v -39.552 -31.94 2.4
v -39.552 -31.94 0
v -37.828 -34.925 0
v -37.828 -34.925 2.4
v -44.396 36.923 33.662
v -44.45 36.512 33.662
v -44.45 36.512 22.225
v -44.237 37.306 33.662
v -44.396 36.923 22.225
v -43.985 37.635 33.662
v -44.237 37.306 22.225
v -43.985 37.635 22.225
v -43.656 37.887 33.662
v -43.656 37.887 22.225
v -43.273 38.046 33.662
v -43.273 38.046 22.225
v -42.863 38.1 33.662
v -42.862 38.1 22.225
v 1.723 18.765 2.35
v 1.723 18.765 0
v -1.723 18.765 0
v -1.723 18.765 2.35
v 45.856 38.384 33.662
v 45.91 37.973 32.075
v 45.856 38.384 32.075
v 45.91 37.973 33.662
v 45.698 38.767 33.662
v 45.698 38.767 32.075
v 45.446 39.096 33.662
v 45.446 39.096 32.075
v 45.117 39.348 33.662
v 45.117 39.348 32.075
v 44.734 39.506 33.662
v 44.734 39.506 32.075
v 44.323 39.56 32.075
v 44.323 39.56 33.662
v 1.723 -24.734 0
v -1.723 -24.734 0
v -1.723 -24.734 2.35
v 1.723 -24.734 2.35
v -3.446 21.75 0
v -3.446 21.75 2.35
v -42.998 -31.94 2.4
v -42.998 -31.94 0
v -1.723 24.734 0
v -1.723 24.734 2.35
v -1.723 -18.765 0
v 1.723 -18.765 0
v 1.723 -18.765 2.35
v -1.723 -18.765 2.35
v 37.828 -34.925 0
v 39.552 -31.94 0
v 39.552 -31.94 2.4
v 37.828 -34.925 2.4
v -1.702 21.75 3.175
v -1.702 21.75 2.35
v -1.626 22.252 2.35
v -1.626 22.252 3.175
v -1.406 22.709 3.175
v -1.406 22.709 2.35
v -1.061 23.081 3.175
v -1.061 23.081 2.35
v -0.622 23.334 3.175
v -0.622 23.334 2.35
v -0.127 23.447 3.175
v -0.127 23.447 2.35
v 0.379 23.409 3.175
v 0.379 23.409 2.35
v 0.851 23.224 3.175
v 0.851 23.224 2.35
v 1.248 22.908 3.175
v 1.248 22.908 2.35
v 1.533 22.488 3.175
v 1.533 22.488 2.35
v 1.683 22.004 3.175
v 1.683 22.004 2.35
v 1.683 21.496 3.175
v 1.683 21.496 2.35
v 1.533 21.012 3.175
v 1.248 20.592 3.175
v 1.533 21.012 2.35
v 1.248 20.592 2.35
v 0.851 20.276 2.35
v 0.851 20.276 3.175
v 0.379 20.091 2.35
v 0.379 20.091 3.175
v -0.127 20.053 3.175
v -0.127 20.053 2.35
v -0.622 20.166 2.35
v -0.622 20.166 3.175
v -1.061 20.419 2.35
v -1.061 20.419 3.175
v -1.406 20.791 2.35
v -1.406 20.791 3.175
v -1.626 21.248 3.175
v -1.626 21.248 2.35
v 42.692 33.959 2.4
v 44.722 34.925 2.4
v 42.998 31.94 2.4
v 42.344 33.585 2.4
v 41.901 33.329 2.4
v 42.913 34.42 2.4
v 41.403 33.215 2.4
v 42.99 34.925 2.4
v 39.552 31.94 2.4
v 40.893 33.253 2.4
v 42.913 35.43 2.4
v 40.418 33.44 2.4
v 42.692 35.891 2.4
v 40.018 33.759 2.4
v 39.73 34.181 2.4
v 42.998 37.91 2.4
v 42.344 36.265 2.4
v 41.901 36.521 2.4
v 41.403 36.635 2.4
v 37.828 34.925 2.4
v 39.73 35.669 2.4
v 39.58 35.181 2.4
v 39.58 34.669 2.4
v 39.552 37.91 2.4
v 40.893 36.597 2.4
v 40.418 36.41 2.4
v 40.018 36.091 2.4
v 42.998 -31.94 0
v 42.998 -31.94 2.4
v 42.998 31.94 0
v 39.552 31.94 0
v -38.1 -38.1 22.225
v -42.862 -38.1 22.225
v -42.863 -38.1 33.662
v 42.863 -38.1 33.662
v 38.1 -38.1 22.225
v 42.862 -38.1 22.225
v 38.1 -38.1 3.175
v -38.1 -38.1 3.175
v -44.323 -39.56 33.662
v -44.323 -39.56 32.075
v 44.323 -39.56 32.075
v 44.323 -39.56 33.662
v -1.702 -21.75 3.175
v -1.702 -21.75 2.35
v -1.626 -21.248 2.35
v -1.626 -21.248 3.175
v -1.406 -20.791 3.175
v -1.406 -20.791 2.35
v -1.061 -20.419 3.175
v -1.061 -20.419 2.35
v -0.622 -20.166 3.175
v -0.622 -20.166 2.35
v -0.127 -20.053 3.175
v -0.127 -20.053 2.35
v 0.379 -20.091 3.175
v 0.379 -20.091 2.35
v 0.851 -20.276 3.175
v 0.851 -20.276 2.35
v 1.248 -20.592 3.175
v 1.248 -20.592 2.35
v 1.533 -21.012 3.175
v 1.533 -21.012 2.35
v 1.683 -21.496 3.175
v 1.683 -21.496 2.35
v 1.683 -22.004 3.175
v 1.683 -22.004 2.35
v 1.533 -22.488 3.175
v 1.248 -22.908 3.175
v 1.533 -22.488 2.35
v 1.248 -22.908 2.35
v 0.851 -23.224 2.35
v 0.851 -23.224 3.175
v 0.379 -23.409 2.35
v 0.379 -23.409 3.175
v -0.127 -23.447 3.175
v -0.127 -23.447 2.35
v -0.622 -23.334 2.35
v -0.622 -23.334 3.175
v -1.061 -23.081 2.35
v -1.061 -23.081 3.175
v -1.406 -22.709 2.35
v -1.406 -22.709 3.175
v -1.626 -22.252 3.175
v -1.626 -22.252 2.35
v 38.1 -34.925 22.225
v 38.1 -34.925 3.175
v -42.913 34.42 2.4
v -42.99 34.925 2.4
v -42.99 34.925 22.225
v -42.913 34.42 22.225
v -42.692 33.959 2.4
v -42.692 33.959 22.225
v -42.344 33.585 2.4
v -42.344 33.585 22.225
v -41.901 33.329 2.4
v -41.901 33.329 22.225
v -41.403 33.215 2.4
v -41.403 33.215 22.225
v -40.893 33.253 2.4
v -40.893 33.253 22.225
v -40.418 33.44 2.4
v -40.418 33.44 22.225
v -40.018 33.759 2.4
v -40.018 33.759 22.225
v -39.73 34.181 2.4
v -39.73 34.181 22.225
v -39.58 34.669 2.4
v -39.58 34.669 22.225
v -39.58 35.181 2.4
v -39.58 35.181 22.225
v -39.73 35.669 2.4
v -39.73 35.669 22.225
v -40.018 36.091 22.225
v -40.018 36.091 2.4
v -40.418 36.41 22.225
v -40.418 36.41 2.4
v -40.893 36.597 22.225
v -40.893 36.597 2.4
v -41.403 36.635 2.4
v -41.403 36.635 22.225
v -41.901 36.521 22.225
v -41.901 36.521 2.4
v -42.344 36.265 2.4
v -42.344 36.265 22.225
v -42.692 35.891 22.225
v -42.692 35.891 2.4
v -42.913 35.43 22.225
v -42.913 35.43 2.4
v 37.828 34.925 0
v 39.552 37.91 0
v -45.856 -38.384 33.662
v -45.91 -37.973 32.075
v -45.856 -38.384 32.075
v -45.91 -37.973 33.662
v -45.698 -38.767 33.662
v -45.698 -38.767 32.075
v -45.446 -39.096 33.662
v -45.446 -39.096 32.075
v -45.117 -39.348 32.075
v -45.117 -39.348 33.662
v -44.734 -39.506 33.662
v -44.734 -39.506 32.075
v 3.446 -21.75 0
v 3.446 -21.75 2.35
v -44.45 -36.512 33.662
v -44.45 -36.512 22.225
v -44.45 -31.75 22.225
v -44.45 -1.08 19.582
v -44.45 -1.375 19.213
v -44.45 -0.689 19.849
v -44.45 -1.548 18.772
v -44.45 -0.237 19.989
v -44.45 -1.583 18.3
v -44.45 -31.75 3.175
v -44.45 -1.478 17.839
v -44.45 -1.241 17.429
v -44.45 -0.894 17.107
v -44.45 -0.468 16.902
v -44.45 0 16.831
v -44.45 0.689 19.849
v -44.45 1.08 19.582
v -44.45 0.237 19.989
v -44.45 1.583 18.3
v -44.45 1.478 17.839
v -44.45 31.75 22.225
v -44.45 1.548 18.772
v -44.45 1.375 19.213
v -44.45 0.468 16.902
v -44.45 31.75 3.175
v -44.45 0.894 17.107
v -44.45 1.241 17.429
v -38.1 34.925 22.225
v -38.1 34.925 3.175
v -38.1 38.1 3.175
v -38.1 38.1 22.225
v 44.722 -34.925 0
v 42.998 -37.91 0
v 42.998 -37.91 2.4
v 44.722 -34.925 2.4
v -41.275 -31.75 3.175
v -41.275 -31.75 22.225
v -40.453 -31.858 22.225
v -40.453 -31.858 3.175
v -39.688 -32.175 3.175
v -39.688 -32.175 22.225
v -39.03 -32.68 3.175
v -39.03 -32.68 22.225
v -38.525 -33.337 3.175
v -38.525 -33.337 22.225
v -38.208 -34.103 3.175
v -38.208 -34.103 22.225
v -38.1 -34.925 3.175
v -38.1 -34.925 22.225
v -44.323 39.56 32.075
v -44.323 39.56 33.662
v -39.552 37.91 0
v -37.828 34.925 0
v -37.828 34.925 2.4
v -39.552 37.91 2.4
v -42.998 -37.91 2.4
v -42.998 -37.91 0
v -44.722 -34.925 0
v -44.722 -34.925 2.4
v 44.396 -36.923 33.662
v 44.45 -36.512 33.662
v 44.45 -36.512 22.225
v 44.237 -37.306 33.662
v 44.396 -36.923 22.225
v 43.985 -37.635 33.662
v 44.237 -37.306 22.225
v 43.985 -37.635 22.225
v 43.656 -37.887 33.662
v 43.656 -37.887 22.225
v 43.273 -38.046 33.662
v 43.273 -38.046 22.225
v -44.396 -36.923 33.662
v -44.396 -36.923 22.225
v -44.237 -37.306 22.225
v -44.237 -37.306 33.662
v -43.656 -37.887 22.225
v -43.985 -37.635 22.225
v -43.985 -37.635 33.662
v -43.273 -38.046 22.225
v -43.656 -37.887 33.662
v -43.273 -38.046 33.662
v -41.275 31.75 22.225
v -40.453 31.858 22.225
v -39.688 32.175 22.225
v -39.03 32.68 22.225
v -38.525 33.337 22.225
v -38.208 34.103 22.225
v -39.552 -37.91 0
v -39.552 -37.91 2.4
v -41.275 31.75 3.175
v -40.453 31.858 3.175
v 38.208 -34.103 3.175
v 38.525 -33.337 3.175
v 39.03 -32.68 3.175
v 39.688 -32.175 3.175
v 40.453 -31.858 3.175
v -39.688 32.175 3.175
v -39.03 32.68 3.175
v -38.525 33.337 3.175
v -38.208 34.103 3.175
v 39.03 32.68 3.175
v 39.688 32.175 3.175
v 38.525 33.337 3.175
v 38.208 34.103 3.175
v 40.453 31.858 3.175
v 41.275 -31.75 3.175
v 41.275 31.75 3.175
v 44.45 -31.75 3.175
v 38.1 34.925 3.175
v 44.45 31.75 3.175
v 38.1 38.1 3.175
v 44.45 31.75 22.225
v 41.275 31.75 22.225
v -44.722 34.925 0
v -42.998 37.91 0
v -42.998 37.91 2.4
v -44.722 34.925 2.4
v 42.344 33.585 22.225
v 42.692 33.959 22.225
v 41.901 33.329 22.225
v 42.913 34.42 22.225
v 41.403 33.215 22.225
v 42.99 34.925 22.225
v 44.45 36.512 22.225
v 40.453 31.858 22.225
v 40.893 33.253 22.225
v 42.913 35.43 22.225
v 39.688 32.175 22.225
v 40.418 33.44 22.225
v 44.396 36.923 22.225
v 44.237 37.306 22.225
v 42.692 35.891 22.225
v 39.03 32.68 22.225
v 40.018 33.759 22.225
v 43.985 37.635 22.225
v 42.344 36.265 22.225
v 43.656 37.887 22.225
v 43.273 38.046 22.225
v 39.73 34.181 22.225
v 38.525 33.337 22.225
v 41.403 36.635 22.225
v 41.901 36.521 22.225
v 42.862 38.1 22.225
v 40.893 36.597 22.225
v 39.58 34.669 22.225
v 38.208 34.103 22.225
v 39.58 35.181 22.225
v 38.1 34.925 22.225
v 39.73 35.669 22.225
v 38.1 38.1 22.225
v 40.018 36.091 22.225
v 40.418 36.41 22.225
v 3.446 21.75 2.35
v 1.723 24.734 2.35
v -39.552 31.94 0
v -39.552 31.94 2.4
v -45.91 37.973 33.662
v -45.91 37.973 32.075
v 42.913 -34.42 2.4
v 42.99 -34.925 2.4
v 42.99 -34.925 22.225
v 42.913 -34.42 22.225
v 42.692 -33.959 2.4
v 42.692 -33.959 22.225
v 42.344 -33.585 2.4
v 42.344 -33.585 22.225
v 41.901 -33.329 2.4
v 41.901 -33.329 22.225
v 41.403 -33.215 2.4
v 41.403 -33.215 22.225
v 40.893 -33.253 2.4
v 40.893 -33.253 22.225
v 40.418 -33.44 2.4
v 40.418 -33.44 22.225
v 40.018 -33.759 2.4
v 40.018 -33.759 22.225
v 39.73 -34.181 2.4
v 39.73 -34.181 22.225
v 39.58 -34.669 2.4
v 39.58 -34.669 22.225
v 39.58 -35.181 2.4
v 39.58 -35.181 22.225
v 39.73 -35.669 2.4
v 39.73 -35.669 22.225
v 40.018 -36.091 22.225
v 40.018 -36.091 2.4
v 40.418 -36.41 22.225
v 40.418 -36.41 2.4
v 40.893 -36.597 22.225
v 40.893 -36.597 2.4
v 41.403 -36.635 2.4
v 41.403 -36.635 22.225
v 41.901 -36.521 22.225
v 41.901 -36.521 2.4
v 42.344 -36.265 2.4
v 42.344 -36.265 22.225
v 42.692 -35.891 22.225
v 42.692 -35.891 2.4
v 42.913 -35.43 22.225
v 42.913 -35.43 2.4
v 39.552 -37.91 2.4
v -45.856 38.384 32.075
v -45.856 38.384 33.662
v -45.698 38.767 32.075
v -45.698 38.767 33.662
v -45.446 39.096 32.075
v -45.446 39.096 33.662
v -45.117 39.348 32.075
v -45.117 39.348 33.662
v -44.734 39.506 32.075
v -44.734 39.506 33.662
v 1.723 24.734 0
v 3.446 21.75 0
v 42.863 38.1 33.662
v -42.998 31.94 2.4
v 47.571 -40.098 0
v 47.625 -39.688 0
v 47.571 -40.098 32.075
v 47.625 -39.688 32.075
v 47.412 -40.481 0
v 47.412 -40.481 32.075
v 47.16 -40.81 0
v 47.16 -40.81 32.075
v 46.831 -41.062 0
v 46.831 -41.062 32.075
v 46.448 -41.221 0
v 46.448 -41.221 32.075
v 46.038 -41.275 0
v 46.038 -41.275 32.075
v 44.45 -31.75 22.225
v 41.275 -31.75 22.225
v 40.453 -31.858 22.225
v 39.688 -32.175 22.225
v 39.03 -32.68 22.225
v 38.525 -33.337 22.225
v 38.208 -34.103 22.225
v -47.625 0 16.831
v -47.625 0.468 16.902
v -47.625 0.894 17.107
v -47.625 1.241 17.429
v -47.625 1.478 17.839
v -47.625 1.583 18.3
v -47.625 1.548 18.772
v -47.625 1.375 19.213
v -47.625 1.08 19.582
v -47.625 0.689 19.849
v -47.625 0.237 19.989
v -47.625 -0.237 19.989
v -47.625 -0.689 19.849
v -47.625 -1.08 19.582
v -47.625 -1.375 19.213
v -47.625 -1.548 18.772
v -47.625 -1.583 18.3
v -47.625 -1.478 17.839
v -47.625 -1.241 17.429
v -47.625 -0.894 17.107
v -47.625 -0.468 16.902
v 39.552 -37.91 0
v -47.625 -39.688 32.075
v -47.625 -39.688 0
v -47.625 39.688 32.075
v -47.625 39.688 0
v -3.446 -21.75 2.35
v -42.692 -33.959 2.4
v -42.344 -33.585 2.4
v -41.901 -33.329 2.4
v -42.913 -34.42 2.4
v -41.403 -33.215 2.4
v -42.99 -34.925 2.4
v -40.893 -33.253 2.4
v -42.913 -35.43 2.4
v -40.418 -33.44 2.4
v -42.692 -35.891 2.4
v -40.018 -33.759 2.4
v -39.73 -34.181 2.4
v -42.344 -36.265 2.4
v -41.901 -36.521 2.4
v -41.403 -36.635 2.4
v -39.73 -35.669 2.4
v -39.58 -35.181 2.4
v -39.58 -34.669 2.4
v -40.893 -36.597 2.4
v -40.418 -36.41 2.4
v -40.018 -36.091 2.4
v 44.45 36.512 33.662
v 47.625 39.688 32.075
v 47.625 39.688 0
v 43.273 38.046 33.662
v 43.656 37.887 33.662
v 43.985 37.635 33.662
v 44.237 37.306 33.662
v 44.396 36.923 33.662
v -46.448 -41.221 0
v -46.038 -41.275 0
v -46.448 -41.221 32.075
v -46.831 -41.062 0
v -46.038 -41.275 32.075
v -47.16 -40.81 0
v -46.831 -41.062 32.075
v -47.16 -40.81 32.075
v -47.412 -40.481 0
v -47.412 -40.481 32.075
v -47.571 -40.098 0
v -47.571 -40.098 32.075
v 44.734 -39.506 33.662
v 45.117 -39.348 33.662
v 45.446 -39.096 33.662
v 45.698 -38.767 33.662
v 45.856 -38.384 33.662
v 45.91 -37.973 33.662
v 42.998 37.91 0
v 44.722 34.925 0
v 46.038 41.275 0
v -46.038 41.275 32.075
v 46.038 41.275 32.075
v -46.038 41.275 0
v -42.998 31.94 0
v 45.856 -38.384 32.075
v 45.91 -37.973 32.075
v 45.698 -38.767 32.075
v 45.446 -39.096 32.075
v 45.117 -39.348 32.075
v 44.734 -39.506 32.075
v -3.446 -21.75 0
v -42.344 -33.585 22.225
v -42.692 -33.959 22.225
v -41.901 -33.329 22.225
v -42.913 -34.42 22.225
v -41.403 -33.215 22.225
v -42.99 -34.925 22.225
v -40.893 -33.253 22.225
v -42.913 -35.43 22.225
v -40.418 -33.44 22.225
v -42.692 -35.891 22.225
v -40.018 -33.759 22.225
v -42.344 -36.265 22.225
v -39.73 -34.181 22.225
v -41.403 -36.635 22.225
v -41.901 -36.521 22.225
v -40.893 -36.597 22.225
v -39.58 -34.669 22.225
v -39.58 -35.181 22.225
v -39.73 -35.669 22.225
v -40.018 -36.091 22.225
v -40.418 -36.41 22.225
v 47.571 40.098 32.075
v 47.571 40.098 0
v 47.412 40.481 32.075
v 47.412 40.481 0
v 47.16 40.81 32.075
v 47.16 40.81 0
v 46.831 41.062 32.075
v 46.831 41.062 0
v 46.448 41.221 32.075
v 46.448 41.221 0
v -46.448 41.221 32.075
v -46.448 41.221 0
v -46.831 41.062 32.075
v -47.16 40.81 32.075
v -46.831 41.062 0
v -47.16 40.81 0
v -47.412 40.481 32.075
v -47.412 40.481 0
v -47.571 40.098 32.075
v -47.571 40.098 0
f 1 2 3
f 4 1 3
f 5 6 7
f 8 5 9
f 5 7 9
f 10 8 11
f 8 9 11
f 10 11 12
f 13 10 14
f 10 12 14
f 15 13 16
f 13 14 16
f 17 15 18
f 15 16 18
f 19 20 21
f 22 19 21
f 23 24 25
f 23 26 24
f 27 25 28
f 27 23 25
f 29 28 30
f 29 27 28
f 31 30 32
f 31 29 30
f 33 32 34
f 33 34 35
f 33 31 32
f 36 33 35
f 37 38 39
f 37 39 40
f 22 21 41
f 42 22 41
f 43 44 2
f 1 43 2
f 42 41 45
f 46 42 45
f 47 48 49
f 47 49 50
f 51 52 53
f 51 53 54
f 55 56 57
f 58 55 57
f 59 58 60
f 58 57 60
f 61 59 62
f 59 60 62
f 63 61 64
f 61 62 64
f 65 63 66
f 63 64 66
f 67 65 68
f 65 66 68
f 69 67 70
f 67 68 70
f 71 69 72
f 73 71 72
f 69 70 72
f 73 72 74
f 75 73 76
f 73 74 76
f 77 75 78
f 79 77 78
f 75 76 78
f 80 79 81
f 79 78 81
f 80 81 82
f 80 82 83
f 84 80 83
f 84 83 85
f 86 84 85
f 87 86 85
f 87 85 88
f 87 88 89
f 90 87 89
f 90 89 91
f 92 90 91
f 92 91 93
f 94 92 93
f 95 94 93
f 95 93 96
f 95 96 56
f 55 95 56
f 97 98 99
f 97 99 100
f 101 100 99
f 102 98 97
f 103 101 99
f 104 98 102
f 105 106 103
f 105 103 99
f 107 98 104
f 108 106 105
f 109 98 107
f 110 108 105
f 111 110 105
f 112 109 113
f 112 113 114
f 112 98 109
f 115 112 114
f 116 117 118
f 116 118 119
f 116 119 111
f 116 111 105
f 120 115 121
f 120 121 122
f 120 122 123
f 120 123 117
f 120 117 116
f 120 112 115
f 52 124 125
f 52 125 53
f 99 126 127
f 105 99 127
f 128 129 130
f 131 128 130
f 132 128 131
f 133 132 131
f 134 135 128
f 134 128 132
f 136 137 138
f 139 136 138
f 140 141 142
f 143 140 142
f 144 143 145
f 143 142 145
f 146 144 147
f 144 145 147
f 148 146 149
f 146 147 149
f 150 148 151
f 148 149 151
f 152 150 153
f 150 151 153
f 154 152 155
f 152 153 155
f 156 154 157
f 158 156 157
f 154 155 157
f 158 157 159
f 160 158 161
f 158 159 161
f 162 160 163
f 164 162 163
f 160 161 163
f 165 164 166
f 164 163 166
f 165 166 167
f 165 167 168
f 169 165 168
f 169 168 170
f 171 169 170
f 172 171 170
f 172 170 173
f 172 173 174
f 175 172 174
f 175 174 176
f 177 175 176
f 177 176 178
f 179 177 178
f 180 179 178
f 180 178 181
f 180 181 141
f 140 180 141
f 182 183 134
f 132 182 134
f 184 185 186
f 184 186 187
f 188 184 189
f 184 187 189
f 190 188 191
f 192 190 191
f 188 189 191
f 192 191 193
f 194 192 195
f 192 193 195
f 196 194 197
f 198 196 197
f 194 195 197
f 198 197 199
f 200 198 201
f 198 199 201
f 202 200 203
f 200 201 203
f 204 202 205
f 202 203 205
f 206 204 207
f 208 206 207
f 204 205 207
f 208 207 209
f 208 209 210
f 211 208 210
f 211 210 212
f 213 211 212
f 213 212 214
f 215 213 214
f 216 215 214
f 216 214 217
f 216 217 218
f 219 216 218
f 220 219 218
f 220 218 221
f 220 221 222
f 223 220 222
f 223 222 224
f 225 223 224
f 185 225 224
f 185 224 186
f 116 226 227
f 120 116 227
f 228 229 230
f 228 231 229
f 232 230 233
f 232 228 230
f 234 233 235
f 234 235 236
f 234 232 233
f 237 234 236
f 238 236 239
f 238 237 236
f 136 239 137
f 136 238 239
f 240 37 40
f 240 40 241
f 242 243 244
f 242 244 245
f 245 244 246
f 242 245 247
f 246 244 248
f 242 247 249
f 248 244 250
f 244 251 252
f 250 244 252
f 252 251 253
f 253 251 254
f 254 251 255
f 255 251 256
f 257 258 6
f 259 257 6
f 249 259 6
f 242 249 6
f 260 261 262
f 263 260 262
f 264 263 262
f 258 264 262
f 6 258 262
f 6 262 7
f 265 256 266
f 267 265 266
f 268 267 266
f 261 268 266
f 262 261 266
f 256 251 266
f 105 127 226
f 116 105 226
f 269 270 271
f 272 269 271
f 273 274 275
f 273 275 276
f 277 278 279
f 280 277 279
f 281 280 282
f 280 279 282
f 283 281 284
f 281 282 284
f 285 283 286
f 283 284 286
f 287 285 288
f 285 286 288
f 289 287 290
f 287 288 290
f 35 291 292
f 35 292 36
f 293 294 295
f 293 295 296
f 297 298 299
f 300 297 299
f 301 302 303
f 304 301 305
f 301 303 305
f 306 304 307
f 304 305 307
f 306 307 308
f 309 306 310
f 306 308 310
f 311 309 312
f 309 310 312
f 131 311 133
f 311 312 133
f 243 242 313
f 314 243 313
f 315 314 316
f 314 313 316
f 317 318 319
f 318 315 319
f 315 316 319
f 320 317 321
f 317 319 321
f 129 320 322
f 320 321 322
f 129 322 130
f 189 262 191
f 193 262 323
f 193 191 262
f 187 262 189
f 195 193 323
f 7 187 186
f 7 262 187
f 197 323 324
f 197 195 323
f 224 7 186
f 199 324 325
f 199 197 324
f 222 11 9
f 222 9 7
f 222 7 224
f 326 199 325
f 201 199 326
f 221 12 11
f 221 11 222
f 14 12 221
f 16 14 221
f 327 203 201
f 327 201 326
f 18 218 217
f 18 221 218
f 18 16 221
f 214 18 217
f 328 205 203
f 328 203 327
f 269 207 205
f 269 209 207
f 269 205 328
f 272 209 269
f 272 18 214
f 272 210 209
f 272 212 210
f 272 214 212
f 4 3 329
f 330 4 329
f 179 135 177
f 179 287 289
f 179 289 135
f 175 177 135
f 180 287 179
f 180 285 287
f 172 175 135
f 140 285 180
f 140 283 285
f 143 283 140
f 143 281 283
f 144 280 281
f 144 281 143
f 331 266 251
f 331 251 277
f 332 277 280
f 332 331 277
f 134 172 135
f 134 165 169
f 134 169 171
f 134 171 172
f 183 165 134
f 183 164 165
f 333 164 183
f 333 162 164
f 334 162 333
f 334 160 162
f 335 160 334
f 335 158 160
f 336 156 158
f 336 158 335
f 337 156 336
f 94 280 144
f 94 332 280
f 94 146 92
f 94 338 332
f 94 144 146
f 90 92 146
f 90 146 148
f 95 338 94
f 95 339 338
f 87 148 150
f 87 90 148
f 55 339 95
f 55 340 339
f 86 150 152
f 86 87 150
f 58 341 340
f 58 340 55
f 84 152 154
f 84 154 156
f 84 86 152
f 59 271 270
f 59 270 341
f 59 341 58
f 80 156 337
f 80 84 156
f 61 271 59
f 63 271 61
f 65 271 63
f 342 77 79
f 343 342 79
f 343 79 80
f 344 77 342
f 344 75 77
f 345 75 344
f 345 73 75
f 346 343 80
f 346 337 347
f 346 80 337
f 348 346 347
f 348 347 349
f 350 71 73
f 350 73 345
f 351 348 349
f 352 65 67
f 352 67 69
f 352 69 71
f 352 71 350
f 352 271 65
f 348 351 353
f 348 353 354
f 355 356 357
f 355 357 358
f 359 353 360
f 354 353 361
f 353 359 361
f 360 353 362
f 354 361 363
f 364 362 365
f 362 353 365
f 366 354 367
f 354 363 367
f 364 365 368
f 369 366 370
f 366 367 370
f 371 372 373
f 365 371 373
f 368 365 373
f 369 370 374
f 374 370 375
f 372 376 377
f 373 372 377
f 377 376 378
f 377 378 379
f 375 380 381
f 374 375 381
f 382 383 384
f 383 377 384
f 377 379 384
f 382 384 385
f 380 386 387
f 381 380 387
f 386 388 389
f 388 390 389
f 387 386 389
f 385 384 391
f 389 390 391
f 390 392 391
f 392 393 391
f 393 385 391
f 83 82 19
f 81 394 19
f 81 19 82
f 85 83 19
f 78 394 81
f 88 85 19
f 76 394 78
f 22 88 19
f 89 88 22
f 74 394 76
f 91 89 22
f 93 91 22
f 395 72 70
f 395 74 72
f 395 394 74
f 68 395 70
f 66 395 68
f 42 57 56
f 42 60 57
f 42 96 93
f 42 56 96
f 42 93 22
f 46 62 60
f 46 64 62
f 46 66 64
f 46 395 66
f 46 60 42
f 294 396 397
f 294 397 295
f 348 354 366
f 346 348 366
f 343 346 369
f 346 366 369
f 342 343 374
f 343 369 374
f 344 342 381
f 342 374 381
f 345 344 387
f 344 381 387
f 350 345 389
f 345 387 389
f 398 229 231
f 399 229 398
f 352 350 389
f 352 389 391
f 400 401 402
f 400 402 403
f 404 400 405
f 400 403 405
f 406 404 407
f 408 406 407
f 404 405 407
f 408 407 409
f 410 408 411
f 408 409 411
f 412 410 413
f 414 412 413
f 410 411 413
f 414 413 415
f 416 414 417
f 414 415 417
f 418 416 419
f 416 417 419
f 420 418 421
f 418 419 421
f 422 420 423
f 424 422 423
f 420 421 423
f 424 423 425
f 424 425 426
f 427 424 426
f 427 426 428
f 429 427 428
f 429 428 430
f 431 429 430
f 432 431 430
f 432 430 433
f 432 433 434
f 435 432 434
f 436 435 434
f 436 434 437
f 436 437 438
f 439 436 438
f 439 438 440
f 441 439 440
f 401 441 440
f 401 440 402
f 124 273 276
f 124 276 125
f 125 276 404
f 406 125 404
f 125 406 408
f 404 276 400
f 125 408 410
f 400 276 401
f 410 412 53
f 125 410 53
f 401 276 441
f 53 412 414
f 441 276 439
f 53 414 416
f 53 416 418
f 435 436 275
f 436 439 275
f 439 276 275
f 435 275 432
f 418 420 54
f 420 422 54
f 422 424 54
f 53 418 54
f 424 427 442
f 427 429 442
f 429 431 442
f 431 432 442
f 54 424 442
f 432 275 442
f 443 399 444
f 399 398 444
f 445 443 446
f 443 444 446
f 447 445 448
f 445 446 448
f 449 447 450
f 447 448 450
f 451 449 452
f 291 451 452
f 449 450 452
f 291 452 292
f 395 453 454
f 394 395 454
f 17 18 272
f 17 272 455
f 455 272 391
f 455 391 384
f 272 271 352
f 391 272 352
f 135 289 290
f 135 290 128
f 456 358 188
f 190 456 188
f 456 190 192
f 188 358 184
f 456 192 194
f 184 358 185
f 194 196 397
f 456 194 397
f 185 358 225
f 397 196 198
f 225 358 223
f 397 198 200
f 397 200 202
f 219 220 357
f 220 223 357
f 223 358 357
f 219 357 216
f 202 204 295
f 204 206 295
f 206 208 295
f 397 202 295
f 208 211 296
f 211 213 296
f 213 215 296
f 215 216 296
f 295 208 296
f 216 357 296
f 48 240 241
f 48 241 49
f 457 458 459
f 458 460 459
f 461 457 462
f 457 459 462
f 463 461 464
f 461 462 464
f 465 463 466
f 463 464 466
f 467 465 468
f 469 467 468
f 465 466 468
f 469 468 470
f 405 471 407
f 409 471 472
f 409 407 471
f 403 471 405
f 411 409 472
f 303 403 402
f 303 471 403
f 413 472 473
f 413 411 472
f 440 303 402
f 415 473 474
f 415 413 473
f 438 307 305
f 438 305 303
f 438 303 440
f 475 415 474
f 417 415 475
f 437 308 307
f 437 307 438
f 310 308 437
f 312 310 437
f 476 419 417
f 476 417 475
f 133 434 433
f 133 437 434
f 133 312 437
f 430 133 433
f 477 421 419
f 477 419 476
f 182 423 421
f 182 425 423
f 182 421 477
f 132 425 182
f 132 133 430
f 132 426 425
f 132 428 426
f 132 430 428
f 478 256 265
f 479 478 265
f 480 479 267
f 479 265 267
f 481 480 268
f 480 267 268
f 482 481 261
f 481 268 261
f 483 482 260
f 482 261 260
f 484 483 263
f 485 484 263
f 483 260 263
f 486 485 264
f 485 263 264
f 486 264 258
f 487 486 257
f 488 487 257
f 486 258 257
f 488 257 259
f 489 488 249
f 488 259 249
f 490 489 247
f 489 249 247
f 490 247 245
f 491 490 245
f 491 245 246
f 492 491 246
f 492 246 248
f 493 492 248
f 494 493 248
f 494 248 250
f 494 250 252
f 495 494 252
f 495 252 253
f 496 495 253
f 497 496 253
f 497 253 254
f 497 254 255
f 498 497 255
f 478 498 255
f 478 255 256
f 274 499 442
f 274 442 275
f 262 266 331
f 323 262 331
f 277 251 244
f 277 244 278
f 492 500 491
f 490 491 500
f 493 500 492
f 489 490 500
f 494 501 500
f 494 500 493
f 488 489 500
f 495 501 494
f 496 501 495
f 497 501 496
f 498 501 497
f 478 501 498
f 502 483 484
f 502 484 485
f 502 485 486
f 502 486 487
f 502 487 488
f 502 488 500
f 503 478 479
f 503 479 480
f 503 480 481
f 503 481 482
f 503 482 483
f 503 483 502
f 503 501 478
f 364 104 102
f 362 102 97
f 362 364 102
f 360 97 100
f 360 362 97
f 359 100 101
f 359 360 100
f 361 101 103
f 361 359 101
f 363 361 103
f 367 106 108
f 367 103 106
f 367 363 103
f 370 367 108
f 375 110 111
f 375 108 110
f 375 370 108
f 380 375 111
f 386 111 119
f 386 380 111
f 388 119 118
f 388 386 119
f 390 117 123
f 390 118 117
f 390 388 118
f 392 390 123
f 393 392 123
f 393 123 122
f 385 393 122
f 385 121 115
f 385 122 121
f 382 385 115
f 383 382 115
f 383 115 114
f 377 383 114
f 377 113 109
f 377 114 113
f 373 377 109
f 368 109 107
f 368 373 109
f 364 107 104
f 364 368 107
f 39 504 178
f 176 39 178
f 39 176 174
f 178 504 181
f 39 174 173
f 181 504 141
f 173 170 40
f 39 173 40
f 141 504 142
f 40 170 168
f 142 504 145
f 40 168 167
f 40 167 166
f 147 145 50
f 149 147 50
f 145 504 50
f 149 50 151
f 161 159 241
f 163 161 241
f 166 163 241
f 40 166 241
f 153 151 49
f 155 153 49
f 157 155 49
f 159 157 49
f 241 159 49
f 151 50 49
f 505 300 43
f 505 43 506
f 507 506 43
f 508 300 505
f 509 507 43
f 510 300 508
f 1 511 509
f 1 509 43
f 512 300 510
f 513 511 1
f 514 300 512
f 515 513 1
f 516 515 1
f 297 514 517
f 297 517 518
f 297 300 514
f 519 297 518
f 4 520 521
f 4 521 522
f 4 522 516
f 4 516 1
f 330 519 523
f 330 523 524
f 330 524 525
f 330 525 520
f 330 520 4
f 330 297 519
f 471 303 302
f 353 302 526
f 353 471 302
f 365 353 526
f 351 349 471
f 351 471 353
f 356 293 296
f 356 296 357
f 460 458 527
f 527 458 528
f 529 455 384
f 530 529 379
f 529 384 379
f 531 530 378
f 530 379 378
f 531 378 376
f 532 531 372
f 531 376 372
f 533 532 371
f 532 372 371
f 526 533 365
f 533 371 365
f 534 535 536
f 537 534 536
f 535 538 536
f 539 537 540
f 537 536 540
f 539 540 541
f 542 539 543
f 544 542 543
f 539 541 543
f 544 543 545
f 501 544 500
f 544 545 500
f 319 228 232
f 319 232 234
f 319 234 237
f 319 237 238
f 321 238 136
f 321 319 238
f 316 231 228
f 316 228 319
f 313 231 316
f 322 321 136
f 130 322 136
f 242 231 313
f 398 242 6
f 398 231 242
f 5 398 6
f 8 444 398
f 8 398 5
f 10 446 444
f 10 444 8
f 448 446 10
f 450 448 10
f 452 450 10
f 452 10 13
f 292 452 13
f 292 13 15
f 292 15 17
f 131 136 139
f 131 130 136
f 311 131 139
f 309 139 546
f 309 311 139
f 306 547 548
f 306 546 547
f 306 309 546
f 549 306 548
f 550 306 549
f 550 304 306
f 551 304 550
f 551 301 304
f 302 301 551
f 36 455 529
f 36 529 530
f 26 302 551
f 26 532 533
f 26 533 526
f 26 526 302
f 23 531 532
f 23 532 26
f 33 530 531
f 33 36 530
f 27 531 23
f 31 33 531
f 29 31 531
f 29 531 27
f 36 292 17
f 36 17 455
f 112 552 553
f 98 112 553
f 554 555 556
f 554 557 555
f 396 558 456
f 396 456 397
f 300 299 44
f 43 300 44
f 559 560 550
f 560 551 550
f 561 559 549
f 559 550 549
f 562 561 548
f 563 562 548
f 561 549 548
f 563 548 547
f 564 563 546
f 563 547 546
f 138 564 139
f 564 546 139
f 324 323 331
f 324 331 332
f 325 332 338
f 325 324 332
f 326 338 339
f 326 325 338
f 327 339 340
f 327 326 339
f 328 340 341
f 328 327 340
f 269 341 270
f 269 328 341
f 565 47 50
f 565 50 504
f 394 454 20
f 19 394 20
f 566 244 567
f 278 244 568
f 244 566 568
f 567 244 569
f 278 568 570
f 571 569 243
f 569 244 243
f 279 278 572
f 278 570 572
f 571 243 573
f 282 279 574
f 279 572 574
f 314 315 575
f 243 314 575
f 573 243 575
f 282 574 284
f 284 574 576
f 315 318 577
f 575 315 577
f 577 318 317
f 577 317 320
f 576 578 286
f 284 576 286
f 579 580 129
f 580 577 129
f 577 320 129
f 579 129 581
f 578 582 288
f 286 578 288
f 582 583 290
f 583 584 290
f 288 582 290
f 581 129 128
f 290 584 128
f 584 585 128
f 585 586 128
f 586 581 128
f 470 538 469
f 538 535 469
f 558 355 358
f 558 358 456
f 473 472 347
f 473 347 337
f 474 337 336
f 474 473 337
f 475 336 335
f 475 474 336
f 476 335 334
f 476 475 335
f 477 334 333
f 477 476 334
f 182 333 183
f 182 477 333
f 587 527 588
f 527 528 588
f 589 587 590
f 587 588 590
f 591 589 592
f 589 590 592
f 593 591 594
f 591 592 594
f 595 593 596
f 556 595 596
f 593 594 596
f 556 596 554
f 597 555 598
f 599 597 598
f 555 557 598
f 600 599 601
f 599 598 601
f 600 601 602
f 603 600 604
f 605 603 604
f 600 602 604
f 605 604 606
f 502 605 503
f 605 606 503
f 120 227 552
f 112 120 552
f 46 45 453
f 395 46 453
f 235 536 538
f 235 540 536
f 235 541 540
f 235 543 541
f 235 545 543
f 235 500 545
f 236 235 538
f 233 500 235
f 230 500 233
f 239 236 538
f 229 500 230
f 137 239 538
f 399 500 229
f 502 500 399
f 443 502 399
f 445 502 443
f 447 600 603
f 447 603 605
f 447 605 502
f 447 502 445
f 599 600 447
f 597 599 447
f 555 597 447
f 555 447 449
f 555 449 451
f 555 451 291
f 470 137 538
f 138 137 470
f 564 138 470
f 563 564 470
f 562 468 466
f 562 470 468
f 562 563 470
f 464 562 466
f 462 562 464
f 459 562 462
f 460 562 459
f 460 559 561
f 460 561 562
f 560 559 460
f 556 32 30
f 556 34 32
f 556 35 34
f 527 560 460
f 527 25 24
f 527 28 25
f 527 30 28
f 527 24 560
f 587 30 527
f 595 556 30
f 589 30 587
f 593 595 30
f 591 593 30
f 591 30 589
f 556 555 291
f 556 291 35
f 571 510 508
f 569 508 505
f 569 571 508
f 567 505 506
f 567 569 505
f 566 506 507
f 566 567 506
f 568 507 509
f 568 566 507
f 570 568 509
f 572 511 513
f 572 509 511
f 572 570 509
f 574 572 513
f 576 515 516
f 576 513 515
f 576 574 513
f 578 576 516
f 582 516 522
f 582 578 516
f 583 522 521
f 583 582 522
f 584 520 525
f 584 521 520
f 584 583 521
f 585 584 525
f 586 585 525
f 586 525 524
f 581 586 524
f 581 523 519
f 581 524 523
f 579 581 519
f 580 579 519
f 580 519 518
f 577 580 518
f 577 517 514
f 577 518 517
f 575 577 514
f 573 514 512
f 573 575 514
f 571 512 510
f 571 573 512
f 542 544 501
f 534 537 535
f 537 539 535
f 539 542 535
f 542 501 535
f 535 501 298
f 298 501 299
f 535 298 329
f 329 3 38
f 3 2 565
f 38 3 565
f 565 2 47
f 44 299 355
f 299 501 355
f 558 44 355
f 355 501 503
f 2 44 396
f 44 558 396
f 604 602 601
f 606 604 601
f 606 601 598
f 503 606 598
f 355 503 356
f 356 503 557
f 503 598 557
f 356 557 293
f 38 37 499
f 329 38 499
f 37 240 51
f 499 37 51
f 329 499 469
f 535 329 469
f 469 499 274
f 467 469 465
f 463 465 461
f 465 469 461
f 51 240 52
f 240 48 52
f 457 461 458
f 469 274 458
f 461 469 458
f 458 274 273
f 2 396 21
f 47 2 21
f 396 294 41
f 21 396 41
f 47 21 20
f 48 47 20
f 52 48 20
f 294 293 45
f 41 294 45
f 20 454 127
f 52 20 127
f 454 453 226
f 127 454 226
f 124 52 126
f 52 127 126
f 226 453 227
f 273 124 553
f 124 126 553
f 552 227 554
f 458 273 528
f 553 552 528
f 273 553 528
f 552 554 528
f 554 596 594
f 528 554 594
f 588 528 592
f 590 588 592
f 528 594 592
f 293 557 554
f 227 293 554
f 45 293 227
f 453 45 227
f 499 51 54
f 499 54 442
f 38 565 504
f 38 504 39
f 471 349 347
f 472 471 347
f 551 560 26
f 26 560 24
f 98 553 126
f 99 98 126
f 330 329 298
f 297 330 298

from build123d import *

# Parameters (mm, degrees)
SKETCH1_W                                    = 95.25
SKETCH1_H                                    = 82.55
BOSS_EXTRUDE1_DEPTH                          = 3.175
SKETCH2_W                                    = 95.25
SKETCH2_H                                    = 82.55
SKETCH2_W_2                                  = 88.9
SKETCH2_H_2                                  = 76.2
BOSS_EXTRUDE2_DEPTH                          = 28.9
SKETCH3_W                                    = 91.821
SKETCH3_H                                    = 79.121
SKETCH3_W_2                                  = 88.9
SKETCH3_H_2                                  = 76.2
BOSS_EXTRUDE3_DEPTH                          = 1.5875
FILLET1_R                                    = 1.5875
SKETCH4_R                                    = 1.7018
CUT_EXTRUDE1_DEPTH                           = 72.448793945
CUT_EXTRUDE2_DEPTH                           = 2.35
BOSS_EXTRUDE4_START                          = 19.05
SKETCH7_R                                    = 3.175
SKETCH7_R_2                                  = 1.7145
BOSS_EXTRUDE4_DEPTH                          = 19.05
SKETCH8_R                                    = 1.7145
CUT_EXTRUDE3_DEPTH                           = 67.826019446
MIRROR1_START                                = 19.05
MIRROR1_AT_THE_SECOND_PLANE_COPY_1_SKETC_R   = 3.175
MIRROR1_AT_THE_SECOND_PLANE_COPY_1_SKETC_R_2 = 1.7145
MIRROR1_AT_THE_SECOND_PLANE_COPY_1_DEPTH     = 19.05
MIRROR1_AT_THE_SECOND_PLANE_COPY_2_SKETC_R   = 1.7145
MIRROR1_AT_THE_SECOND_PLANE_COPY_2_DEPTH     = 67.826019446
CUT_EXTRUDE4_DEPTH                           = 2.4
MIRROR2_AT_THE_SECOND_PLANE_COPY_1_DEPTH     = 2.4
CUT_EXTRUDE5_DEPTH                           = 107.370085815


with BuildPart() as part:
    # Sketch1 → Boss-Extrude1 (new body)
    with BuildSketch(Plane.XY):
        Rectangle(SKETCH1_W, SKETCH1_H)
    extrude(amount=BOSS_EXTRUDE1_DEPTH)

    # Sketch2 → Boss-Extrude2 (add)
    with BuildSketch(Plane.XY.offset(3.175)):
        Rectangle(SKETCH2_W, SKETCH2_H)
        Rectangle(SKETCH2_W_2, SKETCH2_H_2, mode=Mode.SUBTRACT)
    extrude(amount=BOSS_EXTRUDE2_DEPTH)

    # Sketch3 → Boss-Extrude3 (add)
    with BuildSketch(Plane.XY.offset(32.075)):
        Rectangle(SKETCH3_W, SKETCH3_H)
        Rectangle(SKETCH3_W_2, SKETCH3_H_2, mode=Mode.SUBTRACT)
    extrude(amount=BOSS_EXTRUDE3_DEPTH)

    # Fillet1
    fillet1_edges = [part.edges().sort_by_distance(p)[0] for p in [
        (44.45, 38.1, 18.41875),
        (-44.45, 38.1, 18.41875),
        (-44.45, -38.1, 18.41875),
        (44.45, -38.1, 18.41875),
        (45.9105, -39.5605, 32.86875),
        (45.9105, 39.5605, 32.86875),
        (-45.9105, 39.5605, 32.86875),
        (-45.9105, -39.5605, 32.86875),
        (47.625, -41.275, 16.0375),
        (-47.625, -41.275, 16.0375),
        (-47.625, 41.275, 16.0375),
        (47.625, 41.275, 16.0375),
    ]]
    fillet(fillet1_edges, radius=FILLET1_R)

    # Sketch4 → Cut-Extrude1 (cut, through all)
    with BuildSketch(Plane(origin=(0, 0, 0), x_dir=(-1, 0, 0), z_dir=(0, 0, -1))):
        with Locations((0, 21.749999934)):
            Circle(SKETCH4_R)
        with Locations((0, -21.749999934)):
            Circle(SKETCH4_R)
    extrude(amount=-CUT_EXTRUDE1_DEPTH, mode=Mode.SUBTRACT)

    # Sketch5 → Cut-Extrude2 (cut)
    with BuildSketch(Plane(origin=(0, 0, 0), x_dir=(-1, 0, 0), z_dir=(0, 0, -1))):
        Polygon((3.446203757, 21.749999934), (1.723101878, 24.734499934), (-1.723101878, 24.734499934), (-3.446203757, 21.749999934), (-1.723101878, 18.765499934), (1.723101878, 18.765499934), align=None)
        Polygon((1.723101878, -18.765499934), (3.446203757, -21.749999934), (1.723101878, -24.734499934), (-1.723101878, -24.734499934), (-3.446203757, -21.749999934), (-1.723101878, -18.765499934), align=None)
    extrude(amount=-CUT_EXTRUDE2_DEPTH, mode=Mode.SUBTRACT)

    # Sketch7 → Boss-Extrude4 (add)
    # profile 1 of 4: a face of its own
    with BuildSketch(Plane.XY.offset(3.175).offset(BOSS_EXTRUDE4_START)):
        with BuildLine():
            ThreePointArc((-44.45, 34.925), (-43.520064053, 37.170064008), (-41.275000064, 38.1))
            Line((-41.275000064, 38.1), (-42.8625, 38.1))
            ThreePointArc((-42.8625, 38.1), (-43.985032015, 37.635032015), (-44.45, 36.5125))
            Line((-44.45, 36.5125), (-44.45, 34.925))
        make_face()
    # profile 2 of 4: a face of its own
    with BuildSketch(Plane.XY.offset(3.175).offset(BOSS_EXTRUDE4_START)):
        with BuildLine():
            Line((-44.45, 34.925), (-44.45, 31.75))
            Line((-44.45, 31.75), (-41.275, 31.75))
            ThreePointArc((-41.275, 31.75), (-43.52006403, 32.67993597), (-44.45, 34.925))
        make_face()
    # profile 3 of 4: a face of its own
    with BuildSketch(Plane.XY.offset(3.175).offset(BOSS_EXTRUDE4_START)):
        with BuildLine():
            Line((-38.1, 34.925), (-38.1, 38.1))
            Line((-38.1, 38.1), (-41.275000064, 38.1))
            ThreePointArc((-41.275000064, 38.1), (-39.029935992, 37.170064053), (-38.1, 34.925))
        make_face()
    # profile 4 of 4: a face of its own
    with BuildSketch(Plane.XY.offset(3.175).offset(BOSS_EXTRUDE4_START)):
        with Locations((-41.275, 34.925)):
            Circle(SKETCH7_R)
        with Locations(Location((-41.275, 34.925, 0), (0, 0, 180))):
            Circle(SKETCH7_R_2, mode=Mode.SUBTRACT)
    boss_extrude4 = extrude(amount=-BOSS_EXTRUDE4_DEPTH)

    # Sketch8 → Cut-Extrude3 (cut, through all)
    with BuildSketch(Plane.XY.offset(22.225)):
        with Locations(Location((-41.275, 34.925, 0), (0, 0, 180))):
            Circle(SKETCH8_R)
    cut_extrude3 = extrude(amount=-CUT_EXTRUDE3_DEPTH, mode=Mode.SUBTRACT)

    # Mirror1: Boss-Extrude4, Cut-Extrude3 across plane
    add(boss_extrude4.mirror(Plane(origin=(0, 0, 0), x_dir=(0, 0, 1), z_dir=(1, 0, 0))))
    add(cut_extrude3.mirror(Plane(origin=(0, 0, 0), x_dir=(0, 0, 1), z_dir=(1, 0, 0))), mode=Mode.SUBTRACT)

    # Mirror1 at the second plane: Boss-Extrude4, Cut-Extrude3 across plane
    add(boss_extrude4.mirror(Plane.ZX))
    add(cut_extrude3.mirror(Plane.ZX), mode=Mode.SUBTRACT)

    # Mirror1 at the second plane copy 1 sketc → Mirror1 at the second plane copy 1 (add)
    # profile 1 of 4: a face of its own
    with BuildSketch(Plane(origin=(0, 0, 3.175), x_dir=(-1, 0, 0), z_dir=(0, 0, 1)).offset(MIRROR1_START)):
        with BuildLine():
            ThreePointArc((-44.45, 34.925), (-43.520064053, 37.170064008), (-41.275000064, 38.1))
            Line((-41.275000064, 38.1), (-42.8625, 38.1))
            ThreePointArc((-42.8625, 38.1), (-43.985032015, 37.635032015), (-44.45, 36.5125))
            Line((-44.45, 36.5125), (-44.45, 34.925))
        make_face()
    # profile 2 of 4: a face of its own
    with BuildSketch(Plane(origin=(0, 0, 3.175), x_dir=(-1, 0, 0), z_dir=(0, 0, 1)).offset(MIRROR1_START)):
        with BuildLine():
            Line((-44.45, 34.925), (-44.45, 31.75))
            Line((-44.45, 31.75), (-41.275, 31.75))
            ThreePointArc((-41.275, 31.75), (-43.52006403, 32.67993597), (-44.45, 34.925))
        make_face()
    # profile 3 of 4: a face of its own
    with BuildSketch(Plane(origin=(0, 0, 3.175), x_dir=(-1, 0, 0), z_dir=(0, 0, 1)).offset(MIRROR1_START)):
        with BuildLine():
            Line((-38.1, 34.925), (-38.1, 38.1))
            Line((-38.1, 38.1), (-41.275000064, 38.1))
            ThreePointArc((-41.275000064, 38.1), (-39.029935992, 37.170064053), (-38.1, 34.925))
        make_face()
    # profile 4 of 4: a face of its own
    with BuildSketch(Plane(origin=(0, 0, 3.175), x_dir=(-1, 0, 0), z_dir=(0, 0, 1)).offset(MIRROR1_START)):
        with Locations((-41.275, 34.925)):
            Circle(MIRROR1_AT_THE_SECOND_PLANE_COPY_1_SKETC_R)
        with Locations(Location((-41.275, 34.925, 0), (0, 0, 180))):
            Circle(MIRROR1_AT_THE_SECOND_PLANE_COPY_1_SKETC_R_2, mode=Mode.SUBTRACT)
    extrude(amount=-MIRROR1_AT_THE_SECOND_PLANE_COPY_1_DEPTH)

    # Mirror1 at the second plane copy 2 sketc → Mirror1 at the second plane copy 2 (cut, through all)
    with BuildSketch(Plane(origin=(0, 0, 22.225), x_dir=(-1, 0, 0), z_dir=(0, 0, 1))):
        with Locations(Location((-41.275, 34.925, 0), (0, 0, 180))):
            Circle(MIRROR1_AT_THE_SECOND_PLANE_COPY_2_SKETC_R)
    extrude(amount=-MIRROR1_AT_THE_SECOND_PLANE_COPY_2_DEPTH, mode=Mode.SUBTRACT)

    # Sketch9 → Cut-Extrude4 (cut)
    with BuildSketch(Plane(origin=(0, 0, 0), x_dir=(-1, 0, 0), z_dir=(0, 0, -1))):
        Polygon((-37.828218894, 34.925), (-39.551609447, 37.909999999), (-42.998390553, 37.909999999), (-44.721781106, 34.925), (-42.998390553, 31.940000001), (-39.551609447, 31.940000001), align=None)
    cut_extrude4 = extrude(amount=-CUT_EXTRUDE4_DEPTH, mode=Mode.SUBTRACT)

    # Mirror2: Cut-Extrude4 across plane
    add(cut_extrude4.mirror(Plane(origin=(0, 0, 0), x_dir=(0, 0, 1), z_dir=(1, 0, 0))), mode=Mode.SUBTRACT)

    # Mirror2 at the second plane: Cut-Extrude4 across plane
    add(cut_extrude4.mirror(Plane.ZX), mode=Mode.SUBTRACT)

    # Mirror2 at the second plane copy 1 sketc → Mirror2 at the second plane copy 1 (cut)
    with BuildSketch(Plane(origin=(0, 0, 0), x_dir=(1, 0, 0), z_dir=(0, 0, -1))):
        Polygon((-37.828218894, 34.925), (-39.551609447, 37.909999999), (-42.998390553, 37.909999999), (-44.721781106, 34.925), (-42.998390553, 31.940000001), (-39.551609447, 31.940000001), align=None)
    extrude(amount=-MIRROR2_AT_THE_SECOND_PLANE_COPY_1_DEPTH, mode=Mode.SUBTRACT)

    # Sketch10 → Cut-Extrude5 (cut, through all)
    with BuildSketch(Plane(origin=(-44.45, 0, 0), x_dir=(0, 0, -1), z_dir=(1, 0, 0))):
        with BuildLine():
            ThreePointArc((-20.00625, 0), (-18.41875, -1.5875), (-16.83125, 0))
            Line((-16.83125, 0), (-20.00625, 0))
        make_face()
        with BuildLine():
            Line((-20.00625, 0), (-16.83125, 0))
            ThreePointArc((-16.83125, 0), (-18.41875, 1.5875), (-20.00625, 0))
        make_face()
    extrude(amount=-CUT_EXTRUDE5_DEPTH, mode=Mode.SUBTRACT)


solid = part.part
